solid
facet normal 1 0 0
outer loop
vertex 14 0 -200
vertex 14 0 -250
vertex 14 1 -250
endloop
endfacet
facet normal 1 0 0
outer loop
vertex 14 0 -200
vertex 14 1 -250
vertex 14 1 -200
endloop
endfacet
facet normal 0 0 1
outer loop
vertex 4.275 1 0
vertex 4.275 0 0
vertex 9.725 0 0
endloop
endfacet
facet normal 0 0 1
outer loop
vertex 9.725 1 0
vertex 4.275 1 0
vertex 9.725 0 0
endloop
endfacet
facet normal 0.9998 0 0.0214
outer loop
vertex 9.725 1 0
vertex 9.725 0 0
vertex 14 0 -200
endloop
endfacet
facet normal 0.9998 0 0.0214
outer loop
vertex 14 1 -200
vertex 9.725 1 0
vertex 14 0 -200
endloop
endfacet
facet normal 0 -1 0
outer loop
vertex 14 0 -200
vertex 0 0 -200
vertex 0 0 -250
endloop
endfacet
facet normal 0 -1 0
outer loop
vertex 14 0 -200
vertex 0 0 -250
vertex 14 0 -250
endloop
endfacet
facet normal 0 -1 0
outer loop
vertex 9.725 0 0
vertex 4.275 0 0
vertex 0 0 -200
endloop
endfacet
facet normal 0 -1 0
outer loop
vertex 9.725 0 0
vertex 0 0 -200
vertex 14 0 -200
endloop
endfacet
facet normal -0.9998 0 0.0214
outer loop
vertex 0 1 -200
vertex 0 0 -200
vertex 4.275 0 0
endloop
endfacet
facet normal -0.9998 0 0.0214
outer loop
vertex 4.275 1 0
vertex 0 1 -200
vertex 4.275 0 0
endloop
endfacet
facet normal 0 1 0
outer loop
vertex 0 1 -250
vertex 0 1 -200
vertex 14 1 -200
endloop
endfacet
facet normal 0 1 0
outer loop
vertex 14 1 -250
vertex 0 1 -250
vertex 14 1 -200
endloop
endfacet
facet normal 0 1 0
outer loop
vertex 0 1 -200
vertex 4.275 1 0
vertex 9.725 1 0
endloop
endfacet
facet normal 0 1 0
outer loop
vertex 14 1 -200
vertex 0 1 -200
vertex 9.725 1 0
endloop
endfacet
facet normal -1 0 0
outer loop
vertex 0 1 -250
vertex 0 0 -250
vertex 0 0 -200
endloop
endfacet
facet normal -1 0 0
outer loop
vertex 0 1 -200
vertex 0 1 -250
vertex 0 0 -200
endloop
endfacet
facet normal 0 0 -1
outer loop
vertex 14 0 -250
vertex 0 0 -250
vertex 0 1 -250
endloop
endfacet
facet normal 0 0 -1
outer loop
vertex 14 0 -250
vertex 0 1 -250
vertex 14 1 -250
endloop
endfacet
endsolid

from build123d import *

# Parameters (mm, degrees)
BOSS_EXTRUDE1_DEPTH = 1
SKETCH2_W           = 14
SKETCH2_H           = 50
BOSS_EXTRUDE2_DEPTH = 1


with BuildPart() as part:
    # Sketch1 → Boss-Extrude1 (new body)
    with BuildSketch(Plane(origin=(0, 0, 0), x_dir=(1, 0, 0), z_dir=(0, 1, 0))):
        Polygon((9.725, 200), (4.275, 200), (0, 200), (4.275, 0), (9.725, 0), (14, 200), align=None)
    extrude(amount=BOSS_EXTRUDE1_DEPTH)

    # Sketch2 → Boss-Extrude2 (add)
    with BuildSketch(Plane.XZ):
        with Locations((7, -225)):
            Rectangle(SKETCH2_W, SKETCH2_H)
    extrude(amount=-BOSS_EXTRUDE2_DEPTH)


solid = part.part
